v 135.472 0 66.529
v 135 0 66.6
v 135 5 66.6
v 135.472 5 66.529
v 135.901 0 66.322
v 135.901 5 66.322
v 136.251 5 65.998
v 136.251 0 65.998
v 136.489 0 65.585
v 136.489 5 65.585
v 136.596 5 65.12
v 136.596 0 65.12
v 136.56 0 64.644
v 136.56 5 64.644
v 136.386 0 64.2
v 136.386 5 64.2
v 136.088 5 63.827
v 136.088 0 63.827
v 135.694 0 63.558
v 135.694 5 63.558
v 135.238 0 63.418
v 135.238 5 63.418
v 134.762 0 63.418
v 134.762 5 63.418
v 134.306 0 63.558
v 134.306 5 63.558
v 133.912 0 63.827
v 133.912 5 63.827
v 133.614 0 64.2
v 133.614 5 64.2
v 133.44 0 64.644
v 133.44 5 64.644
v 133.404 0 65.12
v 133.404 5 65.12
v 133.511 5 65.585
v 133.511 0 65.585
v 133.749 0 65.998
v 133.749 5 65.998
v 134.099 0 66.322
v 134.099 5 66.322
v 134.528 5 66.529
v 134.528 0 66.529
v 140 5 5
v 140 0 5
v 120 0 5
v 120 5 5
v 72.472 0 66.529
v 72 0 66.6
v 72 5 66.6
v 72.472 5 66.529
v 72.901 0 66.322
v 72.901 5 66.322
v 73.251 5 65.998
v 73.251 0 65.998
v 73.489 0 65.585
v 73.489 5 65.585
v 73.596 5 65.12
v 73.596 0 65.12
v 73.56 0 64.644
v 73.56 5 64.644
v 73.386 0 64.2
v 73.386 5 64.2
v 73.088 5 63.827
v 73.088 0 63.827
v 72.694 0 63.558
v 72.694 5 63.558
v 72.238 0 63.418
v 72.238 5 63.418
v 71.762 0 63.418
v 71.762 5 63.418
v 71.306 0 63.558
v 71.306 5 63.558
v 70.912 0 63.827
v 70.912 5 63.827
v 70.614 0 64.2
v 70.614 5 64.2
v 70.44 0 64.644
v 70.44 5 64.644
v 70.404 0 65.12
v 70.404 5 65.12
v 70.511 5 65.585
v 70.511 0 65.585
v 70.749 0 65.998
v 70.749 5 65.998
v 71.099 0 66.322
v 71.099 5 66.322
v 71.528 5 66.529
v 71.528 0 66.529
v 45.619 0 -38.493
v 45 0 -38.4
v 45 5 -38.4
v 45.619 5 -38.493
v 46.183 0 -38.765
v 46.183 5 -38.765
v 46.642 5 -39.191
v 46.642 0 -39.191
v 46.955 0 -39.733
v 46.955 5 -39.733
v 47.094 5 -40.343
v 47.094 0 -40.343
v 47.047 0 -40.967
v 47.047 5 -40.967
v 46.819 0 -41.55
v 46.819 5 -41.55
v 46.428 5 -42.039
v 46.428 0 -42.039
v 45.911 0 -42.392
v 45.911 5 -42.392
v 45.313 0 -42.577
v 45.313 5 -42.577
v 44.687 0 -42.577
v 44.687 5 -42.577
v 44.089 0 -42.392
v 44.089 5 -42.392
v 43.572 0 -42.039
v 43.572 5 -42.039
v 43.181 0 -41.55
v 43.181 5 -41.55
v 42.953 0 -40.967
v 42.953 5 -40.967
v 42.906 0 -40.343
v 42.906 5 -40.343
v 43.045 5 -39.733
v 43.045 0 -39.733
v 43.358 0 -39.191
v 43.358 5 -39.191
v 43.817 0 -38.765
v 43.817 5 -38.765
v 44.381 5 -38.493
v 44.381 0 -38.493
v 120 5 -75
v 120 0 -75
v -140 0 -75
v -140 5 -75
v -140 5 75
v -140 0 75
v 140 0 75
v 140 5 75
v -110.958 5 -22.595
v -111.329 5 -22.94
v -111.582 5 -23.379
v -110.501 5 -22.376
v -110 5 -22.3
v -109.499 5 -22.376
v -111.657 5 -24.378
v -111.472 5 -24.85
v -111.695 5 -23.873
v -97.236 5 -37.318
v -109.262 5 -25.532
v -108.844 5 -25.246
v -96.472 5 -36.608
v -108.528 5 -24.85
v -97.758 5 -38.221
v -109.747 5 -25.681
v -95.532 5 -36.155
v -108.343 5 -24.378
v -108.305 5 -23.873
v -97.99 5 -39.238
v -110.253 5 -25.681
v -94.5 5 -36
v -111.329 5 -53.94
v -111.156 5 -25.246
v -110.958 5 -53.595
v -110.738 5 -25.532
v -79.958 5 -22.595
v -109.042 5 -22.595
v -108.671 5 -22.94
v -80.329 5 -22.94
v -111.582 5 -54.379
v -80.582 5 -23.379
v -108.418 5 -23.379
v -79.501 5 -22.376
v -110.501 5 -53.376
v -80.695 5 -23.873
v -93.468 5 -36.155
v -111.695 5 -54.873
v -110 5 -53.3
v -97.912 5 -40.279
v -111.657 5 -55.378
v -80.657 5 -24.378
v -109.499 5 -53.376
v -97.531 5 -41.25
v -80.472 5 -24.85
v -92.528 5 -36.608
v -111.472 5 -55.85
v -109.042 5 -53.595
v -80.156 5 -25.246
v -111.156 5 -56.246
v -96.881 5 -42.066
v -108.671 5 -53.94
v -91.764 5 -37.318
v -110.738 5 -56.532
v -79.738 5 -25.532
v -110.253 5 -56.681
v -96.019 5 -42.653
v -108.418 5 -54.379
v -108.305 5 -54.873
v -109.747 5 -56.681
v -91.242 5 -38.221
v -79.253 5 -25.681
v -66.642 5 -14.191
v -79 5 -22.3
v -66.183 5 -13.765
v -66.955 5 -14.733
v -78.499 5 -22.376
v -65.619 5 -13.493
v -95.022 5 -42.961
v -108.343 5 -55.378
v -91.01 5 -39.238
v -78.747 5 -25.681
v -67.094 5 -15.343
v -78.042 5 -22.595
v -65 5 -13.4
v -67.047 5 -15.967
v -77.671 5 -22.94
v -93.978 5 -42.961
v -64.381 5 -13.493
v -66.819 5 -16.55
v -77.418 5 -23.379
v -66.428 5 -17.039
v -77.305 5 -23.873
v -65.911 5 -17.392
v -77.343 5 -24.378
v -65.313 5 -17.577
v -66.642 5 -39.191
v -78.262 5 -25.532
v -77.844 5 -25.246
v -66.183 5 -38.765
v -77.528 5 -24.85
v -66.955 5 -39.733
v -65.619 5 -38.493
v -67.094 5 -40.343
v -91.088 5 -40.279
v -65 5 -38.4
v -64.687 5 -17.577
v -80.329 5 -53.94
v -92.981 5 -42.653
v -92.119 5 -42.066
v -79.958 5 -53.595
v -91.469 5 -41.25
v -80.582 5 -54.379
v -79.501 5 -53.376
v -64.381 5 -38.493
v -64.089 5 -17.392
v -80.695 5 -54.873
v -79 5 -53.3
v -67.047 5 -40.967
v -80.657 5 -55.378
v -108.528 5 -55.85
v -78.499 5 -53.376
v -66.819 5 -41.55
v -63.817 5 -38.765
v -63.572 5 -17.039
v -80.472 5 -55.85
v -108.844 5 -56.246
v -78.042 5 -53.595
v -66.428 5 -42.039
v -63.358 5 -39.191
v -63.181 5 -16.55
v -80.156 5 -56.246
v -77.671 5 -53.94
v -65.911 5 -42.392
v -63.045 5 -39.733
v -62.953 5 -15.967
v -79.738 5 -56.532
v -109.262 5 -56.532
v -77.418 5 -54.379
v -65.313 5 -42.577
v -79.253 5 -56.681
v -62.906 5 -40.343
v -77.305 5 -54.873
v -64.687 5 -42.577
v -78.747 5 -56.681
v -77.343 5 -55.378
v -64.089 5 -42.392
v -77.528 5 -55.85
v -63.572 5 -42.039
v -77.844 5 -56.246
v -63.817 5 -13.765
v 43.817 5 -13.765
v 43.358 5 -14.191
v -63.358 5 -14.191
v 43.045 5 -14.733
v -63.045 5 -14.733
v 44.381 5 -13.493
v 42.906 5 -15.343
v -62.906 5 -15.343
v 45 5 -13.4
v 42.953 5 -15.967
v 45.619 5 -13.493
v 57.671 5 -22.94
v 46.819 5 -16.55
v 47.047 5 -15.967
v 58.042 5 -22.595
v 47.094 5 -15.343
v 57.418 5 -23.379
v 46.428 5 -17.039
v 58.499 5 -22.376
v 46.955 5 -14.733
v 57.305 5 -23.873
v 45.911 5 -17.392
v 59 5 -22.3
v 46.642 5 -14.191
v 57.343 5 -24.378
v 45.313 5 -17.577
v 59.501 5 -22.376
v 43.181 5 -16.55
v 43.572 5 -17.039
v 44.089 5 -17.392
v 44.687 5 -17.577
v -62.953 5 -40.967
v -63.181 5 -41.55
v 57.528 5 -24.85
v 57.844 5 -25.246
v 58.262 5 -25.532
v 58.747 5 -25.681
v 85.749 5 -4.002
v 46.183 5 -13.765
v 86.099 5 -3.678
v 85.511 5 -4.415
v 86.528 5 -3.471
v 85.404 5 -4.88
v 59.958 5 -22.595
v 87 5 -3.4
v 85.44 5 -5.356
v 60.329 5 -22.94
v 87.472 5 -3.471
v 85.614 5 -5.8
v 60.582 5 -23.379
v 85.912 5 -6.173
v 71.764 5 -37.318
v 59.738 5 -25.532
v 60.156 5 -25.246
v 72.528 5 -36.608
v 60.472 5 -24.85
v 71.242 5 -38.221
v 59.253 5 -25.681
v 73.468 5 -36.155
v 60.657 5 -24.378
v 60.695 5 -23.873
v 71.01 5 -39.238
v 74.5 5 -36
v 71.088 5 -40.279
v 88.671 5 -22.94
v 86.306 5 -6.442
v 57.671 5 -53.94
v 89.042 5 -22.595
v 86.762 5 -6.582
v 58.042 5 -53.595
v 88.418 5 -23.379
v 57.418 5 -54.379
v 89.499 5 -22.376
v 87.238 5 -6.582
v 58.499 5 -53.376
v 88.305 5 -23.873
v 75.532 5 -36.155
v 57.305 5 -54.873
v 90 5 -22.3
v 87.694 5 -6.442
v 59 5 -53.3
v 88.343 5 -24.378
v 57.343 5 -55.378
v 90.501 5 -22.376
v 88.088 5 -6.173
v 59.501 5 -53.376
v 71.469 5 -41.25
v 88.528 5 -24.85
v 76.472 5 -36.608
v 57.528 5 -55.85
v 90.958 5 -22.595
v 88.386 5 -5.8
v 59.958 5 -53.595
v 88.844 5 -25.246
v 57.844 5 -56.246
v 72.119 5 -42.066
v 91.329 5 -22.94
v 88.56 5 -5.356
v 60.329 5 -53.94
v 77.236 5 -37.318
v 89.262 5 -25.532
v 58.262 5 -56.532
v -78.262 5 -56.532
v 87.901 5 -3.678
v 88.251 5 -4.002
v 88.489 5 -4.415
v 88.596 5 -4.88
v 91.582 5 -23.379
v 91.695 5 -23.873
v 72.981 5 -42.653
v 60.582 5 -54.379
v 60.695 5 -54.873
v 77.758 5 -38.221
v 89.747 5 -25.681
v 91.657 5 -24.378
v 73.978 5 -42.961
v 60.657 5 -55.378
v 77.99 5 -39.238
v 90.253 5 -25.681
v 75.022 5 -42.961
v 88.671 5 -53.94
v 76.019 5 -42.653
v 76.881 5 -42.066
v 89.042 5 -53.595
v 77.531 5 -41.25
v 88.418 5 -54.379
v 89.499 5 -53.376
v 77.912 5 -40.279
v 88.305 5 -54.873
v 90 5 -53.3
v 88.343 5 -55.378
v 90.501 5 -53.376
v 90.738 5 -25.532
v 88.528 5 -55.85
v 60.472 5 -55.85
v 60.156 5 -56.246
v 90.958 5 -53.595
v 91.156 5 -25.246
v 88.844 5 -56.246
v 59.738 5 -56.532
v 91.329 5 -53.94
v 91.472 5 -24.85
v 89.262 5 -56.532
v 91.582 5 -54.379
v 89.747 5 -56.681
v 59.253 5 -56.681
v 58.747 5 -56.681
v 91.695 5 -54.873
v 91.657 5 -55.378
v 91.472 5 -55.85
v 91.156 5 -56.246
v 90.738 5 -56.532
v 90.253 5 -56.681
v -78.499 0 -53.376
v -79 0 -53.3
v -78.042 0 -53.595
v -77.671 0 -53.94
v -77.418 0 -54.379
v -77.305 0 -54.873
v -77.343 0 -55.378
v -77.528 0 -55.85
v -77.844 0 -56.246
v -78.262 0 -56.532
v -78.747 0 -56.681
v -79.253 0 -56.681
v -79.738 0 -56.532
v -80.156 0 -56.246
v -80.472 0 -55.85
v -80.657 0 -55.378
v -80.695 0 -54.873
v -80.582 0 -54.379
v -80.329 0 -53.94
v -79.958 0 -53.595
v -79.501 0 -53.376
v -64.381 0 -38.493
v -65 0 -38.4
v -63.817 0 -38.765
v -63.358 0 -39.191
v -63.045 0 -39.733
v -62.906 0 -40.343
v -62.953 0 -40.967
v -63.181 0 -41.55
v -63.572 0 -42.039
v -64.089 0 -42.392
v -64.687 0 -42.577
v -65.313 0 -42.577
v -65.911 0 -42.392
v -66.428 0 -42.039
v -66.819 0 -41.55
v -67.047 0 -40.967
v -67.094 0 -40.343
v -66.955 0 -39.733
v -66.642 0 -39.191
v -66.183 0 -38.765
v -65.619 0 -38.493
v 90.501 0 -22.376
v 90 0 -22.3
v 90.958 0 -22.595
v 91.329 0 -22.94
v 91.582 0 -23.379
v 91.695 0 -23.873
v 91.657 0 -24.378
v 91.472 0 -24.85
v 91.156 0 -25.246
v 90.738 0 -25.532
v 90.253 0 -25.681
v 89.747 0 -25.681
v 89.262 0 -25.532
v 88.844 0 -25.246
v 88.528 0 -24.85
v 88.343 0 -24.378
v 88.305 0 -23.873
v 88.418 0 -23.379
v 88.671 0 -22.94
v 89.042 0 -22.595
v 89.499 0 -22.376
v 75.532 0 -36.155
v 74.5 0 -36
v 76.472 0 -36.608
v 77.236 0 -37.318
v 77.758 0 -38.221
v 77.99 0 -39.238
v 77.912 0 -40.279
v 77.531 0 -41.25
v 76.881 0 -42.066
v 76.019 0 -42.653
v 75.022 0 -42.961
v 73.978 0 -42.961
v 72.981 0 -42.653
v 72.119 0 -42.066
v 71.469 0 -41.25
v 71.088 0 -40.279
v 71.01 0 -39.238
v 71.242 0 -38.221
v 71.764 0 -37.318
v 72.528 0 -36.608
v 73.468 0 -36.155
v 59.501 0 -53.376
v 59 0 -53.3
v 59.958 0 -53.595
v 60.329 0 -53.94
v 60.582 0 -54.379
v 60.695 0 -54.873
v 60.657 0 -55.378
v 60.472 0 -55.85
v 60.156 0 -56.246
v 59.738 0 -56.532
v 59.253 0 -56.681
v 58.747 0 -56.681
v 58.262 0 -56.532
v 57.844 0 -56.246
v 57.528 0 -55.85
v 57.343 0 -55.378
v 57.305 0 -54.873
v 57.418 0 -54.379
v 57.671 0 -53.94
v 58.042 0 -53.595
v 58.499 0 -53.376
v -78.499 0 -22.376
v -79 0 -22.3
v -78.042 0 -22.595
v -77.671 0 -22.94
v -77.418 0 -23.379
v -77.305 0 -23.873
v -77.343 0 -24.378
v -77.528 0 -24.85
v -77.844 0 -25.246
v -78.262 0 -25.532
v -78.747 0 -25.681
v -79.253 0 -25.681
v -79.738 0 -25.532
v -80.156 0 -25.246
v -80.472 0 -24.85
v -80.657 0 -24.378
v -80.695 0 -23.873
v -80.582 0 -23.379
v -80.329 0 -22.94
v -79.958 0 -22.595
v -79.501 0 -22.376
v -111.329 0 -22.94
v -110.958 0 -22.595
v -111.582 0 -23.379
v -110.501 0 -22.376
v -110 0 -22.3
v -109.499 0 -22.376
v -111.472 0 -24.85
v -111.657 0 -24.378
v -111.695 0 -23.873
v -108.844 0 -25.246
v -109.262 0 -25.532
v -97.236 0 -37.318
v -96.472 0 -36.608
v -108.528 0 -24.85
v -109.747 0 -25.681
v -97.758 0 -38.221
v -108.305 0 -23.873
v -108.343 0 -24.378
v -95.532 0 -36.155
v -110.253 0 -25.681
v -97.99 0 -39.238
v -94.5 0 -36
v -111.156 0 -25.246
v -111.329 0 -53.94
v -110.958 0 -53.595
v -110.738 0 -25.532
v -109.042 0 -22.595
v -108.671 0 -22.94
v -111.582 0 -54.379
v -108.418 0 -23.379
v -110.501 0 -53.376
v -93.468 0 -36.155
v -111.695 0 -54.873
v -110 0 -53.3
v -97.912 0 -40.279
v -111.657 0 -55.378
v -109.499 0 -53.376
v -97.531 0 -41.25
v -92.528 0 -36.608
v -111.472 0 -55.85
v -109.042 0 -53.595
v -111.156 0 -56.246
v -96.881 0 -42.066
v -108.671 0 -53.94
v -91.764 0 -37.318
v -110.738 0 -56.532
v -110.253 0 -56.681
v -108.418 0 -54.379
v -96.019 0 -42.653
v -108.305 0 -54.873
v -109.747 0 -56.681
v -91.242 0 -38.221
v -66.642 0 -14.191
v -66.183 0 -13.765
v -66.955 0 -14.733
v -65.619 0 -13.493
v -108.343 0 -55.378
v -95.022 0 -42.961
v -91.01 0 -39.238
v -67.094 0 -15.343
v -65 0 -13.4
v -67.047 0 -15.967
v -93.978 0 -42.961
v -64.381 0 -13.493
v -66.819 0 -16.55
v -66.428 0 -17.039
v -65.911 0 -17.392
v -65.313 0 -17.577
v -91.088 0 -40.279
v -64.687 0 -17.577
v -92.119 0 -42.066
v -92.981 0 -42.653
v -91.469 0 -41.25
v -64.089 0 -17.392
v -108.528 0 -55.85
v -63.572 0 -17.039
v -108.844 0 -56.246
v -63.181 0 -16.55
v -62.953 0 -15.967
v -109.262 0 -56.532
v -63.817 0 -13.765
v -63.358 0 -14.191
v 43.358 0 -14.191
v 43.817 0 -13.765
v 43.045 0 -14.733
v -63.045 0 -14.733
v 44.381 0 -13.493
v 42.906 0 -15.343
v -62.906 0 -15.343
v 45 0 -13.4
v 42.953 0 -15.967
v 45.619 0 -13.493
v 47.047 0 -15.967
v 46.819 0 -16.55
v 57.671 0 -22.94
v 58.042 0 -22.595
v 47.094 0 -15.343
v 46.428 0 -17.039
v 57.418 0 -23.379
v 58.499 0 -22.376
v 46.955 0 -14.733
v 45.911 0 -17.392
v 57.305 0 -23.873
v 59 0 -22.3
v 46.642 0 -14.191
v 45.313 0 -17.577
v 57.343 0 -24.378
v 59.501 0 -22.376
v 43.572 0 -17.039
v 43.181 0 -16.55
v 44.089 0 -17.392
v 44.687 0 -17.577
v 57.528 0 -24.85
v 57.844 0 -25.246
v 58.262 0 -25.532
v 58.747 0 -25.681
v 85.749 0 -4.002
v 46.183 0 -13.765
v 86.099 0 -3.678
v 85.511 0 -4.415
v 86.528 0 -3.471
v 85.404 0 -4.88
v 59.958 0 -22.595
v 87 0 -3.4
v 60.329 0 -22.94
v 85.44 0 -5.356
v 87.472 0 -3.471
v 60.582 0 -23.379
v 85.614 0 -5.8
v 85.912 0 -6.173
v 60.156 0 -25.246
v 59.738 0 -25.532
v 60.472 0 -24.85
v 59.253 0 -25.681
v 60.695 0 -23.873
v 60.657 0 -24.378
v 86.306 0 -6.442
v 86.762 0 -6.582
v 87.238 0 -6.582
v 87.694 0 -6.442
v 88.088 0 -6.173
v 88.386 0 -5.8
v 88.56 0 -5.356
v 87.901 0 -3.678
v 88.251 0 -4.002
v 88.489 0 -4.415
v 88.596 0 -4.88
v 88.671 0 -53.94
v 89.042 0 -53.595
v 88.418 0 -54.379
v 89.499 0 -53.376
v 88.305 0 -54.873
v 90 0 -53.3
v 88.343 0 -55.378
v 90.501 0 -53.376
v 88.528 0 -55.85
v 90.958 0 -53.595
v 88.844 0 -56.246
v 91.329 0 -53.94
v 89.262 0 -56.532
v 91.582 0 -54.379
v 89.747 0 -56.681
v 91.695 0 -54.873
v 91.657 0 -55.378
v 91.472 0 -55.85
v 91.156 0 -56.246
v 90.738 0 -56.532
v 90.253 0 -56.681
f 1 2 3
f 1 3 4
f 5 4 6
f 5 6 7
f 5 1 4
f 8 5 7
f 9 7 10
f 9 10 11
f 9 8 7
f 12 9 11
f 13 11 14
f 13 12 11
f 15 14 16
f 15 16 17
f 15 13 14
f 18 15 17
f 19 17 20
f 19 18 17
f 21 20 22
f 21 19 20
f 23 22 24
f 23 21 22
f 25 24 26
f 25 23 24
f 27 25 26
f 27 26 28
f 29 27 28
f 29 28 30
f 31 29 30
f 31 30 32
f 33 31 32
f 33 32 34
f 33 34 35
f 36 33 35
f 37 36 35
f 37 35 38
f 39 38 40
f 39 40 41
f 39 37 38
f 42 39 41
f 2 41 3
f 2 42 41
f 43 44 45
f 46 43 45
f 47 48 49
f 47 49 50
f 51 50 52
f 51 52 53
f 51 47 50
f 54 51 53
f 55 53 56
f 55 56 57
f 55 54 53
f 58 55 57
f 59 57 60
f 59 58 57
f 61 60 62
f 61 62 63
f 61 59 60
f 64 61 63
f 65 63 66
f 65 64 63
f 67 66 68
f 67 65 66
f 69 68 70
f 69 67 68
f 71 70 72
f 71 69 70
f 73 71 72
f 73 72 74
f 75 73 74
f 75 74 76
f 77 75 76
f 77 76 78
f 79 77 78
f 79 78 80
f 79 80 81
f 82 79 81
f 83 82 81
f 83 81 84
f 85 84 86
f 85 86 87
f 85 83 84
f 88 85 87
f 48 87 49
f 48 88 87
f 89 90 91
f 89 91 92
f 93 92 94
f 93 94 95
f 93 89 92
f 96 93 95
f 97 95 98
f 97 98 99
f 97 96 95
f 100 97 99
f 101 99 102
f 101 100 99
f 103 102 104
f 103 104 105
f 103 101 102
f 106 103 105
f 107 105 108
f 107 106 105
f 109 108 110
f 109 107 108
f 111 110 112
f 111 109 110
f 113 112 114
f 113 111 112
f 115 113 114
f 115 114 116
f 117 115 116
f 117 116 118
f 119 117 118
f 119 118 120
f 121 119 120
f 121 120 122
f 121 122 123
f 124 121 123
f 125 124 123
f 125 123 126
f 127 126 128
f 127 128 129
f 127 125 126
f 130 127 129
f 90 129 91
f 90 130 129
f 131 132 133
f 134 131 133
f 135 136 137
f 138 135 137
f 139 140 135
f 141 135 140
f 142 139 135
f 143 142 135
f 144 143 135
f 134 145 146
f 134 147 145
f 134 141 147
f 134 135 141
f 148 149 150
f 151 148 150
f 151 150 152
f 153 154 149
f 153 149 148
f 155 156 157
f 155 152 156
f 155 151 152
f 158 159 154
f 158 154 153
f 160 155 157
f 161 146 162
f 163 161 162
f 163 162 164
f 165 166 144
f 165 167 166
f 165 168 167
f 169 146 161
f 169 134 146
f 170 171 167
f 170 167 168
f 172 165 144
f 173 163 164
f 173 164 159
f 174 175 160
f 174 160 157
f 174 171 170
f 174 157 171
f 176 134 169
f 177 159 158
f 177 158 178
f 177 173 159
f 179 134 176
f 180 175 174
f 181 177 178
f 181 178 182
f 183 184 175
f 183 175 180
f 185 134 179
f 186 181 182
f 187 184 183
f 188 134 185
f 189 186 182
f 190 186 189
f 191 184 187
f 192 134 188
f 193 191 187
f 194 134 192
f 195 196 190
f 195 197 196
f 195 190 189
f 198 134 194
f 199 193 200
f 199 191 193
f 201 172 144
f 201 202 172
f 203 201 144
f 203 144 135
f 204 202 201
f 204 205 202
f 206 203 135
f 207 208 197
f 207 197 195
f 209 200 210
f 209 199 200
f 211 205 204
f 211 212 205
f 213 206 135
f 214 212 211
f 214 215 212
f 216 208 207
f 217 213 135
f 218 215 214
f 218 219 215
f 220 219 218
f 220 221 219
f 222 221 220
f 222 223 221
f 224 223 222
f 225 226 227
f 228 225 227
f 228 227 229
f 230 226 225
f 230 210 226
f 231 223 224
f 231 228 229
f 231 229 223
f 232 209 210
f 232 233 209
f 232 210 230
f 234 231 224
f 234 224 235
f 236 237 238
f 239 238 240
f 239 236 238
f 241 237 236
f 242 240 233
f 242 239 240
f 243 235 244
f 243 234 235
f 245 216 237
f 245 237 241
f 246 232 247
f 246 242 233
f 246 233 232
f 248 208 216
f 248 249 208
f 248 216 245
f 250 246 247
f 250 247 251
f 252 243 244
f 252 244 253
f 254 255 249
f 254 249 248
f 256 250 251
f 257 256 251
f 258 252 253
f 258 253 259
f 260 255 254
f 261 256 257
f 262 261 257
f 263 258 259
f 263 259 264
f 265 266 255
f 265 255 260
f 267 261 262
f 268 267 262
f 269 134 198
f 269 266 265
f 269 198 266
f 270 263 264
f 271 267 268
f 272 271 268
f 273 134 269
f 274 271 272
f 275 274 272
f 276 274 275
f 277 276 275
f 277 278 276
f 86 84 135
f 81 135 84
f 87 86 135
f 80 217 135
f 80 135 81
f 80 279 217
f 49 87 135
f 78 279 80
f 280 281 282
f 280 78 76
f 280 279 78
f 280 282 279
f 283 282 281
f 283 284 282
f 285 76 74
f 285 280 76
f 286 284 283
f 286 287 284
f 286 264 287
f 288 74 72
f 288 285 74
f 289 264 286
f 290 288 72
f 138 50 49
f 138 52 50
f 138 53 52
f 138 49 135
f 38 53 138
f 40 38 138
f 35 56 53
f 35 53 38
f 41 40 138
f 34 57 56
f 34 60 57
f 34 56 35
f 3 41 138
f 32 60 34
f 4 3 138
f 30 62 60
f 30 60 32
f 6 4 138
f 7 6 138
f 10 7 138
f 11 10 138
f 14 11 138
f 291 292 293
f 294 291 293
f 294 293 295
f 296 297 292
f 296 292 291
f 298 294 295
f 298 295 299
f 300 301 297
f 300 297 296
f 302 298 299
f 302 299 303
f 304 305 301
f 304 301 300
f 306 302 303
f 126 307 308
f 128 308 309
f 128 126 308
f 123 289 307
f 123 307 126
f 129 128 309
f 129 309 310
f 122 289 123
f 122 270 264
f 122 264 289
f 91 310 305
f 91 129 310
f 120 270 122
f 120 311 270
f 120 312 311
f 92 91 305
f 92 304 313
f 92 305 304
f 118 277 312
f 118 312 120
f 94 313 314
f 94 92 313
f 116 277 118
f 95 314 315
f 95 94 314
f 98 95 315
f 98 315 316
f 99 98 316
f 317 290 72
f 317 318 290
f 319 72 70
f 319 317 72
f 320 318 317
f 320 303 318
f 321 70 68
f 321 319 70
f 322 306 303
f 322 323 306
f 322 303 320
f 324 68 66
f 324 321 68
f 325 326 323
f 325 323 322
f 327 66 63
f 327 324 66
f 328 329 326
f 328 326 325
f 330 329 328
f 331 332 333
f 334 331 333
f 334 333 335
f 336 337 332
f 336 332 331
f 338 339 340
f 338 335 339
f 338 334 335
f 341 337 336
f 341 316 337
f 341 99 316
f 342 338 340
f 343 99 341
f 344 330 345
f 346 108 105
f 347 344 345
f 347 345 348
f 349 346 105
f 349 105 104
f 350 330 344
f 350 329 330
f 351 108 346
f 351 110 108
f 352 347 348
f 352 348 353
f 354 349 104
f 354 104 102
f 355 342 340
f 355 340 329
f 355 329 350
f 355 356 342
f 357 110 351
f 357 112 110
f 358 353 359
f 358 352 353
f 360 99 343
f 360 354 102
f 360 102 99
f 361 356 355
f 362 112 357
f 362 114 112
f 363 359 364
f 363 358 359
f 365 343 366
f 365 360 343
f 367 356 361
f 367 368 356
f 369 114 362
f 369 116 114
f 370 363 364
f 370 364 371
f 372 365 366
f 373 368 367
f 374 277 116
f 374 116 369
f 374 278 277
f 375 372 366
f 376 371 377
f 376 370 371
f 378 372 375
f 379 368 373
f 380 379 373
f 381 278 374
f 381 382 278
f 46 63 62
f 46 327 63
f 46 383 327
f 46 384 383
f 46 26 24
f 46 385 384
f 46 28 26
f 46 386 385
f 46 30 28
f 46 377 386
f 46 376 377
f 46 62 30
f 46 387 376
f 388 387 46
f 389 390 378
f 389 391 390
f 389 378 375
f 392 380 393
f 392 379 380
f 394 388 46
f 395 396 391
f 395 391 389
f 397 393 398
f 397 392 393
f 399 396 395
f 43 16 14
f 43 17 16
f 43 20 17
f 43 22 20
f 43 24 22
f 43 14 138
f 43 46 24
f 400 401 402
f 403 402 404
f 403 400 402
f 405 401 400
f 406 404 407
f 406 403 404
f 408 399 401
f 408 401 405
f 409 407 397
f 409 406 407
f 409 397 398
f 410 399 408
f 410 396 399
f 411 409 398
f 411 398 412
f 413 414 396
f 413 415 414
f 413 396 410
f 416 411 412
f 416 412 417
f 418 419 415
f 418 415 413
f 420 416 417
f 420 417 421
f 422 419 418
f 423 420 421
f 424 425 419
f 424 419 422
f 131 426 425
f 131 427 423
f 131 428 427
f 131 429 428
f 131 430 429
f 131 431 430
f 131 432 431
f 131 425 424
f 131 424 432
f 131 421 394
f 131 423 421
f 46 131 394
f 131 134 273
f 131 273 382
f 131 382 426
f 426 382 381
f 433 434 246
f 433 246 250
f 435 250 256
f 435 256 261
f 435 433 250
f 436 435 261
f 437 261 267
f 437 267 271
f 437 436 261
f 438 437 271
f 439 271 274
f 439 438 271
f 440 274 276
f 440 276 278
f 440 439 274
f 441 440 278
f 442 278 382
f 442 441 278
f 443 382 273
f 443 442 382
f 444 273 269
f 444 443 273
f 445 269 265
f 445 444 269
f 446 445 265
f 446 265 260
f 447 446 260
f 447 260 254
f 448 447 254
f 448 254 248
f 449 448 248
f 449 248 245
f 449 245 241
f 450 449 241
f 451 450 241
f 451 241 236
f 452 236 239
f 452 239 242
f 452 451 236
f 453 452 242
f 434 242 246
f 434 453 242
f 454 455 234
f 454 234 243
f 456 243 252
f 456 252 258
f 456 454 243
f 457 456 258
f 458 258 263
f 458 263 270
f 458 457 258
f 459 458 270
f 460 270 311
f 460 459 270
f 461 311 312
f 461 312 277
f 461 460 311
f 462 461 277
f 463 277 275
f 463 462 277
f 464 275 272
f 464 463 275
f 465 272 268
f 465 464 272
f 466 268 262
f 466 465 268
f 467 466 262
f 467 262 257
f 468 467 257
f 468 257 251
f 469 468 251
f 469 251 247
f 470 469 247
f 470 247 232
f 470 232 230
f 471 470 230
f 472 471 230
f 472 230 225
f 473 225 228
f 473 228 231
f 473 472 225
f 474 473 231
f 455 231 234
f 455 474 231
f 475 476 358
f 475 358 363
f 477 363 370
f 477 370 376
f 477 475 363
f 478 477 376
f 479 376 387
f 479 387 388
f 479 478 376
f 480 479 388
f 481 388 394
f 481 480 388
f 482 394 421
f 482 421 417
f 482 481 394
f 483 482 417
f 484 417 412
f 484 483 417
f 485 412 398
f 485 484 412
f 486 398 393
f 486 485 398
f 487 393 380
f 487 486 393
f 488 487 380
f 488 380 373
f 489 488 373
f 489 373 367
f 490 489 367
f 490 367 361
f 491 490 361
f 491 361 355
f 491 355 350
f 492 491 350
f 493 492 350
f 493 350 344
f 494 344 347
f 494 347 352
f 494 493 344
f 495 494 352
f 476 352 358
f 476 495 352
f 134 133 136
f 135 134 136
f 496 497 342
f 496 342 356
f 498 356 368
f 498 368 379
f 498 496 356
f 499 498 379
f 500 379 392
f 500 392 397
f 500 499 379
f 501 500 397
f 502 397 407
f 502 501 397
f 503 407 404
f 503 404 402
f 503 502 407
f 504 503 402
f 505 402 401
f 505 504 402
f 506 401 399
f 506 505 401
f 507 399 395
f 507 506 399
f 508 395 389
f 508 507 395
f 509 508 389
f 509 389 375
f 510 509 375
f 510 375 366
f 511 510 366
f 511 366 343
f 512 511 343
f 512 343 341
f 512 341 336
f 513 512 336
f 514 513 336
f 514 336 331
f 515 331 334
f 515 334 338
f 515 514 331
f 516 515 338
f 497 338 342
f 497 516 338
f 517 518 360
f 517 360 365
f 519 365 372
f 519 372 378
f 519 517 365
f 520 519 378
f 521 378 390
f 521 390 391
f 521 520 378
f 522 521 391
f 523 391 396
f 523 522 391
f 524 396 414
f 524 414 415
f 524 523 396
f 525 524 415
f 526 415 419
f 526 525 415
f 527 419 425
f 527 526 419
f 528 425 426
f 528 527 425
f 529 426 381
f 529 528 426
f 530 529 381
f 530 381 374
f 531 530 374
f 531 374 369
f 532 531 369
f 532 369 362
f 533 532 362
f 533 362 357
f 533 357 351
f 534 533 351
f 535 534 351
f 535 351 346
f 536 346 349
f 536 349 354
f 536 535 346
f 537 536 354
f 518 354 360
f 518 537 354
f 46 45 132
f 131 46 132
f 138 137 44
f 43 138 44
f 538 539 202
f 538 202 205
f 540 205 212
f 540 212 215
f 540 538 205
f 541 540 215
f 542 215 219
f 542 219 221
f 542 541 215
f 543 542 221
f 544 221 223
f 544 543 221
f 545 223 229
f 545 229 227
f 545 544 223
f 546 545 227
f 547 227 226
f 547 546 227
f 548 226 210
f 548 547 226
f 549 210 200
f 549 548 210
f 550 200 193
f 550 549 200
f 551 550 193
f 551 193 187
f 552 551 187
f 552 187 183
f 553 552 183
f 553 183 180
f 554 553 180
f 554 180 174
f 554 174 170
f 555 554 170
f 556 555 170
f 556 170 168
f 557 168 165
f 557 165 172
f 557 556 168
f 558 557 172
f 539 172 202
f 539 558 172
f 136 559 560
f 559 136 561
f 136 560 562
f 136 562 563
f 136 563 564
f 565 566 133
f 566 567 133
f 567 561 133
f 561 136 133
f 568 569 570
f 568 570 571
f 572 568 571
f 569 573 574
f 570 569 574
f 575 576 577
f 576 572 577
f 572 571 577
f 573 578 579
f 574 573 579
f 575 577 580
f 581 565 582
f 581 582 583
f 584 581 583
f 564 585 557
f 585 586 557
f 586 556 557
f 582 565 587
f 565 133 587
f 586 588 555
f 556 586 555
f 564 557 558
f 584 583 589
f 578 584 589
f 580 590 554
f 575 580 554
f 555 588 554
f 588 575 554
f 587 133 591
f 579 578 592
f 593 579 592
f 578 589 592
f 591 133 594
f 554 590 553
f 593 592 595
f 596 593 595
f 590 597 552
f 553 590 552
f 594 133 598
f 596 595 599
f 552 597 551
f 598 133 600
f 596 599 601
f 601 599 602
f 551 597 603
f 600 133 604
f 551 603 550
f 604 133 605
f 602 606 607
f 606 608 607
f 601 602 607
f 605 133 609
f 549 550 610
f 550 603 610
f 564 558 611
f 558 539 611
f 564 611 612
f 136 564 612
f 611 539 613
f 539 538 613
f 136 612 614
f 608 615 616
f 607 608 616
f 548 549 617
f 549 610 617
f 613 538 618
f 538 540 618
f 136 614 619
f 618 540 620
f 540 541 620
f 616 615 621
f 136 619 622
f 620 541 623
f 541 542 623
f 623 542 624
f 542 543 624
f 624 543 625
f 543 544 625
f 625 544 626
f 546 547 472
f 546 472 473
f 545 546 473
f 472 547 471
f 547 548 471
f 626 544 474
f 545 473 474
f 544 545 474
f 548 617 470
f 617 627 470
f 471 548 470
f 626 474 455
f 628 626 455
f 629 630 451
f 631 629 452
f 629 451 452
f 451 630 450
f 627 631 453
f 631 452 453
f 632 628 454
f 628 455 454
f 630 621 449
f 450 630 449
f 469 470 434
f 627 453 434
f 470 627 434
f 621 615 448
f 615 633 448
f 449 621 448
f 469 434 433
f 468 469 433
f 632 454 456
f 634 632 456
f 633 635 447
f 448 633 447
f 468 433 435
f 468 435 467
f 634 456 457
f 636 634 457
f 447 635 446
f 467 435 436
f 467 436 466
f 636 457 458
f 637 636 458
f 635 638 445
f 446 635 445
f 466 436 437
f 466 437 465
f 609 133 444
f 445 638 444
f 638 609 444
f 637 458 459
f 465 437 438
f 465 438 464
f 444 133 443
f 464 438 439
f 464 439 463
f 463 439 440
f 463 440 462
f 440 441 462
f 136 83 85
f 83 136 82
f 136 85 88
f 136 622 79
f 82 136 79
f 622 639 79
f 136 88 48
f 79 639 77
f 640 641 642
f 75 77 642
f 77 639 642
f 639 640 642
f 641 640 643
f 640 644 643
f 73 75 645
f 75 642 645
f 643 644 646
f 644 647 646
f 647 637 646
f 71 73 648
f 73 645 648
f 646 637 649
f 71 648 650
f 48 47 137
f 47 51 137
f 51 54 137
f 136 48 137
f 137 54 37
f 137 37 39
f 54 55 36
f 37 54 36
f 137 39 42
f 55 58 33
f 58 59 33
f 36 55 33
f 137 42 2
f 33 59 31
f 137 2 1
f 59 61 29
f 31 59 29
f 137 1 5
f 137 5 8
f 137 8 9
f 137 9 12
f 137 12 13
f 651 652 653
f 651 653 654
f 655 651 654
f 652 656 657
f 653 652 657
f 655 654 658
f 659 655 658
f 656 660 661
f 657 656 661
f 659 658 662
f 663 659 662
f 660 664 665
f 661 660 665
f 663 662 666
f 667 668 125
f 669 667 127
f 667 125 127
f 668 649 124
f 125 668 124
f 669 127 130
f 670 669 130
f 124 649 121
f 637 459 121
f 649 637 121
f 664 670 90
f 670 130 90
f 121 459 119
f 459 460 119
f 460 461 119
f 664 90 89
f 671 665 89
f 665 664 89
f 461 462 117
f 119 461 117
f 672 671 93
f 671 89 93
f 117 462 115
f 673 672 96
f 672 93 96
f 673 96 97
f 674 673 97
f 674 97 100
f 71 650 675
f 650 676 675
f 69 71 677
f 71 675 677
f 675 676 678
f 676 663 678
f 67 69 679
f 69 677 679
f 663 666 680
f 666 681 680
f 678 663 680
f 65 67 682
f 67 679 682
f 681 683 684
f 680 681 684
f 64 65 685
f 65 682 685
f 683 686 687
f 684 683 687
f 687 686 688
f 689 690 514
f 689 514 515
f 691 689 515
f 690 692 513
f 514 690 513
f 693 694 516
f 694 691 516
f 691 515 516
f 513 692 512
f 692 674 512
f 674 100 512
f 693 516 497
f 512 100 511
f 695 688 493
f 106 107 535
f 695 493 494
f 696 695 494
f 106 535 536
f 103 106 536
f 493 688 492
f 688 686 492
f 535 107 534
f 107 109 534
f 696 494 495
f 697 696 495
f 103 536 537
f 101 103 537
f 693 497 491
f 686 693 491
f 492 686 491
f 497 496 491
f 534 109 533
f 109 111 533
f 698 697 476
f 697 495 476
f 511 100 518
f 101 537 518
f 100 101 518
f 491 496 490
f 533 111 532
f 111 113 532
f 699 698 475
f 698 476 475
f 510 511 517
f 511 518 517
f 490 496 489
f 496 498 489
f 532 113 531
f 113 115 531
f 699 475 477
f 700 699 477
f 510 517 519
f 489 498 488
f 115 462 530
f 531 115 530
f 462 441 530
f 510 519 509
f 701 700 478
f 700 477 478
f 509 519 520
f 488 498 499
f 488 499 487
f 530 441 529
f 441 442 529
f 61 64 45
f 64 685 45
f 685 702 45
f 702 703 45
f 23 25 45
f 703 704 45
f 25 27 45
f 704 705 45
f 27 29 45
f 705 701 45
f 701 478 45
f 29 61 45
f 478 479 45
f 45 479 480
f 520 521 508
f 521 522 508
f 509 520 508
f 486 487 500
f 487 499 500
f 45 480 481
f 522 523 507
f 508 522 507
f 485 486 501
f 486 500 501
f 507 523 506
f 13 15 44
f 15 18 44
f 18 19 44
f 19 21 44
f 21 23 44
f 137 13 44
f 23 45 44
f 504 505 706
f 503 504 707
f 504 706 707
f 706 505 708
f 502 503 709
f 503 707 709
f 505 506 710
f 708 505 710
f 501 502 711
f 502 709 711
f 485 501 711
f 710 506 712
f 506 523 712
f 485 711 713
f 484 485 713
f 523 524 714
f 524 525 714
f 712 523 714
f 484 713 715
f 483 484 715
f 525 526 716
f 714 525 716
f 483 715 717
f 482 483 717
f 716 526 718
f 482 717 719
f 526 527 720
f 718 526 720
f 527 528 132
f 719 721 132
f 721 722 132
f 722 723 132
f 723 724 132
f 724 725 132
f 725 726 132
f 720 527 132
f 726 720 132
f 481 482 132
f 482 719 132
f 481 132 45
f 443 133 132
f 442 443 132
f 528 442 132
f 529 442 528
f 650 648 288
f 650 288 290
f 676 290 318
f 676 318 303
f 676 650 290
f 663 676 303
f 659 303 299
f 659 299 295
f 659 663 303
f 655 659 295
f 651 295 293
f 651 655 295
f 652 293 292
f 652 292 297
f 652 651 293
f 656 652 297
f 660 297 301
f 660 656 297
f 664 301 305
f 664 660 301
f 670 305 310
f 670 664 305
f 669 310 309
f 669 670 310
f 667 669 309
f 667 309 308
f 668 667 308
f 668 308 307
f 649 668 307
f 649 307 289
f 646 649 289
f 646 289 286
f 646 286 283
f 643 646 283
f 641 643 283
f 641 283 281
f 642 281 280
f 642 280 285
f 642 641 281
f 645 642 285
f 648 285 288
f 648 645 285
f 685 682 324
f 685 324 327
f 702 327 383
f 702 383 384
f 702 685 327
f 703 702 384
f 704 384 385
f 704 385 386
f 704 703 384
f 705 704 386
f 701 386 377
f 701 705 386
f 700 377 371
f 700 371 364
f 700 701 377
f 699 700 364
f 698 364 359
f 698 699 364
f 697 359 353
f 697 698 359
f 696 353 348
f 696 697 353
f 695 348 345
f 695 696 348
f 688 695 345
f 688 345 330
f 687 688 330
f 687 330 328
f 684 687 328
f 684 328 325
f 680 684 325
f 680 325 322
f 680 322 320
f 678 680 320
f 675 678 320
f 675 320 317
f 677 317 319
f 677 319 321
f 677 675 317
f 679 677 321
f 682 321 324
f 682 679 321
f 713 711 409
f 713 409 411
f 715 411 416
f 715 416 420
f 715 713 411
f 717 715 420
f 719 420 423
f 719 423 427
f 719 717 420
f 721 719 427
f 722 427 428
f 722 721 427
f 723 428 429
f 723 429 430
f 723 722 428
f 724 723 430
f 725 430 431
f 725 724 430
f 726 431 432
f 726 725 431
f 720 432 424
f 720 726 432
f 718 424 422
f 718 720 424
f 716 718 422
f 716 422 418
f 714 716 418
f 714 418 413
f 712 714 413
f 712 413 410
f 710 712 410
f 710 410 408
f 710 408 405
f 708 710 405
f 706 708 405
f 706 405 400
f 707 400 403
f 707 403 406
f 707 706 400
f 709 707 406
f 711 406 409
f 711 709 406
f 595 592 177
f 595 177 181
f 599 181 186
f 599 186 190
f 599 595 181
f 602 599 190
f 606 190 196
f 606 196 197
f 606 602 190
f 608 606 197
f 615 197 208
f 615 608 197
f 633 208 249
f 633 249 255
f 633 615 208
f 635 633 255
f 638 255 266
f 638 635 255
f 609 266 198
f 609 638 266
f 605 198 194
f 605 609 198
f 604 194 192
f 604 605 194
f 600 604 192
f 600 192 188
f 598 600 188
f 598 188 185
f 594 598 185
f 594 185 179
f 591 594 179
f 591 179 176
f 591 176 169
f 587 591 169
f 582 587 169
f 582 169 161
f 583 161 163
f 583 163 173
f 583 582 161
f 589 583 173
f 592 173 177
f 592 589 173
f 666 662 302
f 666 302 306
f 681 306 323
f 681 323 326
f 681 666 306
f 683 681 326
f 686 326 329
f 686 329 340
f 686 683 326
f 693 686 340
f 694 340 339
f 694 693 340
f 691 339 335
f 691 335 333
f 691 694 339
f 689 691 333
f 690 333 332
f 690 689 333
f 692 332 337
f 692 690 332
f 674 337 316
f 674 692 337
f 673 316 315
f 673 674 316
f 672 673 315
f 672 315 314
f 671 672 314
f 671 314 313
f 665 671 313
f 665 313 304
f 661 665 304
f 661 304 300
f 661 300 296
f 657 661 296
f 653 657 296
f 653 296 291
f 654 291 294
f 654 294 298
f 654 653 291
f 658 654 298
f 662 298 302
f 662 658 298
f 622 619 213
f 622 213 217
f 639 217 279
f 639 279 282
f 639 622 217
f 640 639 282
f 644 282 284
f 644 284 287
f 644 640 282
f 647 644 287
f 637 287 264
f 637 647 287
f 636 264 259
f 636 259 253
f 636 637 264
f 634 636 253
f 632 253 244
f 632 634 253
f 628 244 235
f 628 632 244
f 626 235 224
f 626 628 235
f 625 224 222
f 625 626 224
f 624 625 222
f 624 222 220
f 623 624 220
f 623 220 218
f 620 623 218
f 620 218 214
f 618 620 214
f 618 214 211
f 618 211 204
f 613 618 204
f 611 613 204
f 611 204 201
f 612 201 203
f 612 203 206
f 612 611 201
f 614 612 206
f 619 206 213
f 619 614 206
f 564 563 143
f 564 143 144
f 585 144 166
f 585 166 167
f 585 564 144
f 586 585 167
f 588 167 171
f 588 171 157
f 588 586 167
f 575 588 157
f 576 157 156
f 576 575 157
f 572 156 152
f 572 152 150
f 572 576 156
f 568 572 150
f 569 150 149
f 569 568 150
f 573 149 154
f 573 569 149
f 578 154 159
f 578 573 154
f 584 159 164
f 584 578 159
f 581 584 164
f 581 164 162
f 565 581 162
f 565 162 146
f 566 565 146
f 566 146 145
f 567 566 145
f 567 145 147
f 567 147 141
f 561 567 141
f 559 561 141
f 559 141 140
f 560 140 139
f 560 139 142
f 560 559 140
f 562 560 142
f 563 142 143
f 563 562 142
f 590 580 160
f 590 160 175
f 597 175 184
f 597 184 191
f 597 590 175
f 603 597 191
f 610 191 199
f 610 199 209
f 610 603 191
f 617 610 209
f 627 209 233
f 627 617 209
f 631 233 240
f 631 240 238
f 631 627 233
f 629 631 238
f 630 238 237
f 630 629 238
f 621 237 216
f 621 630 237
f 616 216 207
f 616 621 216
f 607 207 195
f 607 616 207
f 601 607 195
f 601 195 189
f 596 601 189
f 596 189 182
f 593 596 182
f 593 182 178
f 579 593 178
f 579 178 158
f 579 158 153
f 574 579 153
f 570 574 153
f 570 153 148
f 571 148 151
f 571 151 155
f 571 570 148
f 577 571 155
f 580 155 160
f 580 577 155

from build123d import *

# Parameters (mm, degrees)
SKETCH_1_R      = 1.6
SKETCH_1_R_2    = 1.7
SKETCH_1_R_3    = 2.1
SKETCH_1_R_4    = 3.5
EXTRUDE_1_DEPTH = 5


with BuildPart() as part:
    # 草图1 → 凸台-拉伸1 (new body)
    with BuildSketch(Plane(origin=(0, 0, 0), x_dir=(1, 0, 0), z_dir=(0, 1, 0))):
        Polygon((-140, 75), (-140, -75), (140, -75), (140, -5), (120, -5), (120, 75), align=None)
        with Locations(Location((72, -65, 0), (0, 0, 270))):
            Circle(SKETCH_1_R, mode=Mode.SUBTRACT)
        with Locations(Location((135, -65, 0), (0, 0, 270))):
            Circle(SKETCH_1_R, mode=Mode.SUBTRACT)
        with Locations(Location((-110, 24, 0), (0, 0, 270))):
            Circle(SKETCH_1_R_2, mode=Mode.SUBTRACT)
        with Locations(Location((-79, 24, 0), (0, 0, 270))):
            Circle(SKETCH_1_R_2, mode=Mode.SUBTRACT)
        with Locations(Location((-65, 15.5, 0), (0, 0, 270))):
            Circle(SKETCH_1_R_3, mode=Mode.SUBTRACT)
        with Locations(Location((-110, 55, 0), (0, 0, 270))):
            Circle(SKETCH_1_R_2, mode=Mode.SUBTRACT)
        with Locations(Location((-94.5, 39.5, 0), (0, 0, 270))):
            Circle(SKETCH_1_R_4, mode=Mode.SUBTRACT)
        with Locations(Location((-79, 55, 0), (0, 0, 270))):
            Circle(SKETCH_1_R_2, mode=Mode.SUBTRACT)
        with Locations(Location((-65, 40.5, 0), (0, 0, 270))):
            Circle(SKETCH_1_R_3, mode=Mode.SUBTRACT)
        with Locations(Location((45, 15.5, 0), (0, 0, 270))):
            Circle(SKETCH_1_R_3, mode=Mode.SUBTRACT)
        with Locations(Location((59, 24, 0), (0, 0, 270))):
            Circle(SKETCH_1_R_2, mode=Mode.SUBTRACT)
        with Locations(Location((87, 5, 0), (0, 0, 270))):
            Circle(SKETCH_1_R, mode=Mode.SUBTRACT)
        with Locations(Location((90, 24, 0), (0, 0, 270))):
            Circle(SKETCH_1_R_2, mode=Mode.SUBTRACT)
        with Locations(Location((45, 40.5, 0), (0, 0, 270))):
            Circle(SKETCH_1_R_3, mode=Mode.SUBTRACT)
        with Locations(Location((59, 55, 0), (0, 0, 270))):
            Circle(SKETCH_1_R_2, mode=Mode.SUBTRACT)
        with Locations(Location((74.5, 39.5, 0), (0, 0, 270))):
            Circle(SKETCH_1_R_4, mode=Mode.SUBTRACT)
        with Locations(Location((90, 55, 0), (0, 0, 270))):
            Circle(SKETCH_1_R_2, mode=Mode.SUBTRACT)
    extrude(amount=EXTRUDE_1_DEPTH)


solid = part.part
